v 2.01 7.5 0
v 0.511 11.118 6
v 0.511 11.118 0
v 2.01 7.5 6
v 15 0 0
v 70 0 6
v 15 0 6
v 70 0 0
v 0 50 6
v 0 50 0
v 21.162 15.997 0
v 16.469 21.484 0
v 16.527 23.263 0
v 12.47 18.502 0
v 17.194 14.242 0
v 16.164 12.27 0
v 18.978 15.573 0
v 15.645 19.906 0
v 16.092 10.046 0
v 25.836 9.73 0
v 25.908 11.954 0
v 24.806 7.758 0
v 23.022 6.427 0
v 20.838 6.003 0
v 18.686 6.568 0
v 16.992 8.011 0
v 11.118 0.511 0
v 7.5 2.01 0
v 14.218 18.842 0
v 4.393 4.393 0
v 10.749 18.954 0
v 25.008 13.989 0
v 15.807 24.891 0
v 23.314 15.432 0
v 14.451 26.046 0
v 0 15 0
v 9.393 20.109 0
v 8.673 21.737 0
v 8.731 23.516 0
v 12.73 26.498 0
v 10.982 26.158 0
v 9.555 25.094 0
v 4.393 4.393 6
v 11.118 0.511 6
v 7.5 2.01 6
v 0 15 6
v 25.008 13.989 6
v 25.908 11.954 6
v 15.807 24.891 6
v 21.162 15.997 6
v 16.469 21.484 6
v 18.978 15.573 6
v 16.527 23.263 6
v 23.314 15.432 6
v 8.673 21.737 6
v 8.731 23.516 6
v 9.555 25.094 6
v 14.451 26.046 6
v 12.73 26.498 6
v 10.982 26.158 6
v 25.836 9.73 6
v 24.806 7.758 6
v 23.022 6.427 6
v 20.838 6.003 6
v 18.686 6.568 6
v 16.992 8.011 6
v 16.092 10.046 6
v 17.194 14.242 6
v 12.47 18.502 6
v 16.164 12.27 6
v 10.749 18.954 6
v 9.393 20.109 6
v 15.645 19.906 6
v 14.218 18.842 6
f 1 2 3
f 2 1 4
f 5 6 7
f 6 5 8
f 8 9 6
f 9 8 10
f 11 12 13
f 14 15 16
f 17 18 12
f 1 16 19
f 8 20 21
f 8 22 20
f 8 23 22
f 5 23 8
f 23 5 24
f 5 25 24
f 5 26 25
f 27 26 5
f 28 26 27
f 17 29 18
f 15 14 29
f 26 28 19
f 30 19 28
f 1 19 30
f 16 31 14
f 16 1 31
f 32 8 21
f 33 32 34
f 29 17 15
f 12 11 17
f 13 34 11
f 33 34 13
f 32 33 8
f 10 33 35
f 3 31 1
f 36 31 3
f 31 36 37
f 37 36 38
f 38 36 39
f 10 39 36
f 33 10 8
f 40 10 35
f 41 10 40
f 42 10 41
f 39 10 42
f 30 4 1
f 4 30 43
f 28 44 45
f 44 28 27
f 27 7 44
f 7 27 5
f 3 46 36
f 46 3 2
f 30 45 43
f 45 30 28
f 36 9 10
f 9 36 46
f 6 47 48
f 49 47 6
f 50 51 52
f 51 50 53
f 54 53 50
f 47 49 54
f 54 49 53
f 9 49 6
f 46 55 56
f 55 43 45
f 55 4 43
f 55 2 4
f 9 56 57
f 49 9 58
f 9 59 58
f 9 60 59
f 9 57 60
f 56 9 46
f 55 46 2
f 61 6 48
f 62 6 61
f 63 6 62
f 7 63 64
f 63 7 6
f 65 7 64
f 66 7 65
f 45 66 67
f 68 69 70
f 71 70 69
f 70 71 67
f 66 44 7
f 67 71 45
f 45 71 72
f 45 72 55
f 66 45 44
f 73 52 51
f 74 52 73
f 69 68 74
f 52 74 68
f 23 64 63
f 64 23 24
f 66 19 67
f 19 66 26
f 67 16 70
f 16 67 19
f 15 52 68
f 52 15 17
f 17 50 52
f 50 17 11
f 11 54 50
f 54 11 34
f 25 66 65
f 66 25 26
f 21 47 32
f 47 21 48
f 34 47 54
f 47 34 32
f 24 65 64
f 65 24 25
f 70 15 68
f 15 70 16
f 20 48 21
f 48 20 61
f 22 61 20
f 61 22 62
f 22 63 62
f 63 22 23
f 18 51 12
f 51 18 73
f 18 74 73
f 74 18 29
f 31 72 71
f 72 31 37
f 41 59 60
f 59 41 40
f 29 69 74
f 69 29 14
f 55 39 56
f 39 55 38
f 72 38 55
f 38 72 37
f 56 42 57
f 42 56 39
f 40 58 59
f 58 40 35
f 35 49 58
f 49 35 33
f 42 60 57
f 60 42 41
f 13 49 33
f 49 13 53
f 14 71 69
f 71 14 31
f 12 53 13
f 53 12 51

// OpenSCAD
$fn = 32;

// ----------------------------------------------------------------------
// Bracket plate: corner pad 70 x 50, fillet R15
// ----------------------------------------------------------------------

// --- parameters (mm) ---
hole_r = 4;               // bolt hole radius
plate_t = 6;              // plate thickness, Z (extrusion height)
leg_a = 70;               // base leg
leg_b = 50;               // height leg
fillet_r = 15;            // right-angle fillet radius

hole_d1 = 2 * hole_r + 2;
hole_d2 = 2 * hole_r;

profile = [[15, 0], [70, 0], [0, 50], [0, 15], [0.511, 11.118], [2.01, 7.5], [4.393, 4.393], [7.5, 2.01], [11.118, 0.511]];  // primary outline, 9 points, counter clockwise
void_1 = [[25.908, 11.954], [25.008, 13.989], [23.314, 15.432], [21.162, 15.997], [18.978, 15.573], [17.194, 14.242], [16.164, 12.27], [16.092, 10.046], [16.992, 8.011], [18.686, 6.568], [20.838, 6.003], [23.022, 6.427], [24.806, 7.758], [25.836, 9.73]];  // mount hole 1, 14 points
void_2 = [[16.527, 23.263], [15.807, 24.891], [14.451, 26.046], [12.73, 26.498], [10.982, 26.158], [9.555, 25.094], [8.731, 23.516], [8.673, 21.737], [9.393, 20.109], [10.749, 18.954], [12.47, 18.502], [14.218, 18.842], [15.645, 19.906], [16.469, 21.484]];  // mount hole 2, 14 points

// --- the one profile operation ---
difference() {
  linear_extrude(height = plate_t) polygon(points = profile);
  translate([0, 0, -1])
    linear_extrude(height = plate_t + 2) polygon(points = void_1);
  translate([0, 0, -1])
    linear_extrude(height = plate_t + 2) polygon(points = void_2);
}
